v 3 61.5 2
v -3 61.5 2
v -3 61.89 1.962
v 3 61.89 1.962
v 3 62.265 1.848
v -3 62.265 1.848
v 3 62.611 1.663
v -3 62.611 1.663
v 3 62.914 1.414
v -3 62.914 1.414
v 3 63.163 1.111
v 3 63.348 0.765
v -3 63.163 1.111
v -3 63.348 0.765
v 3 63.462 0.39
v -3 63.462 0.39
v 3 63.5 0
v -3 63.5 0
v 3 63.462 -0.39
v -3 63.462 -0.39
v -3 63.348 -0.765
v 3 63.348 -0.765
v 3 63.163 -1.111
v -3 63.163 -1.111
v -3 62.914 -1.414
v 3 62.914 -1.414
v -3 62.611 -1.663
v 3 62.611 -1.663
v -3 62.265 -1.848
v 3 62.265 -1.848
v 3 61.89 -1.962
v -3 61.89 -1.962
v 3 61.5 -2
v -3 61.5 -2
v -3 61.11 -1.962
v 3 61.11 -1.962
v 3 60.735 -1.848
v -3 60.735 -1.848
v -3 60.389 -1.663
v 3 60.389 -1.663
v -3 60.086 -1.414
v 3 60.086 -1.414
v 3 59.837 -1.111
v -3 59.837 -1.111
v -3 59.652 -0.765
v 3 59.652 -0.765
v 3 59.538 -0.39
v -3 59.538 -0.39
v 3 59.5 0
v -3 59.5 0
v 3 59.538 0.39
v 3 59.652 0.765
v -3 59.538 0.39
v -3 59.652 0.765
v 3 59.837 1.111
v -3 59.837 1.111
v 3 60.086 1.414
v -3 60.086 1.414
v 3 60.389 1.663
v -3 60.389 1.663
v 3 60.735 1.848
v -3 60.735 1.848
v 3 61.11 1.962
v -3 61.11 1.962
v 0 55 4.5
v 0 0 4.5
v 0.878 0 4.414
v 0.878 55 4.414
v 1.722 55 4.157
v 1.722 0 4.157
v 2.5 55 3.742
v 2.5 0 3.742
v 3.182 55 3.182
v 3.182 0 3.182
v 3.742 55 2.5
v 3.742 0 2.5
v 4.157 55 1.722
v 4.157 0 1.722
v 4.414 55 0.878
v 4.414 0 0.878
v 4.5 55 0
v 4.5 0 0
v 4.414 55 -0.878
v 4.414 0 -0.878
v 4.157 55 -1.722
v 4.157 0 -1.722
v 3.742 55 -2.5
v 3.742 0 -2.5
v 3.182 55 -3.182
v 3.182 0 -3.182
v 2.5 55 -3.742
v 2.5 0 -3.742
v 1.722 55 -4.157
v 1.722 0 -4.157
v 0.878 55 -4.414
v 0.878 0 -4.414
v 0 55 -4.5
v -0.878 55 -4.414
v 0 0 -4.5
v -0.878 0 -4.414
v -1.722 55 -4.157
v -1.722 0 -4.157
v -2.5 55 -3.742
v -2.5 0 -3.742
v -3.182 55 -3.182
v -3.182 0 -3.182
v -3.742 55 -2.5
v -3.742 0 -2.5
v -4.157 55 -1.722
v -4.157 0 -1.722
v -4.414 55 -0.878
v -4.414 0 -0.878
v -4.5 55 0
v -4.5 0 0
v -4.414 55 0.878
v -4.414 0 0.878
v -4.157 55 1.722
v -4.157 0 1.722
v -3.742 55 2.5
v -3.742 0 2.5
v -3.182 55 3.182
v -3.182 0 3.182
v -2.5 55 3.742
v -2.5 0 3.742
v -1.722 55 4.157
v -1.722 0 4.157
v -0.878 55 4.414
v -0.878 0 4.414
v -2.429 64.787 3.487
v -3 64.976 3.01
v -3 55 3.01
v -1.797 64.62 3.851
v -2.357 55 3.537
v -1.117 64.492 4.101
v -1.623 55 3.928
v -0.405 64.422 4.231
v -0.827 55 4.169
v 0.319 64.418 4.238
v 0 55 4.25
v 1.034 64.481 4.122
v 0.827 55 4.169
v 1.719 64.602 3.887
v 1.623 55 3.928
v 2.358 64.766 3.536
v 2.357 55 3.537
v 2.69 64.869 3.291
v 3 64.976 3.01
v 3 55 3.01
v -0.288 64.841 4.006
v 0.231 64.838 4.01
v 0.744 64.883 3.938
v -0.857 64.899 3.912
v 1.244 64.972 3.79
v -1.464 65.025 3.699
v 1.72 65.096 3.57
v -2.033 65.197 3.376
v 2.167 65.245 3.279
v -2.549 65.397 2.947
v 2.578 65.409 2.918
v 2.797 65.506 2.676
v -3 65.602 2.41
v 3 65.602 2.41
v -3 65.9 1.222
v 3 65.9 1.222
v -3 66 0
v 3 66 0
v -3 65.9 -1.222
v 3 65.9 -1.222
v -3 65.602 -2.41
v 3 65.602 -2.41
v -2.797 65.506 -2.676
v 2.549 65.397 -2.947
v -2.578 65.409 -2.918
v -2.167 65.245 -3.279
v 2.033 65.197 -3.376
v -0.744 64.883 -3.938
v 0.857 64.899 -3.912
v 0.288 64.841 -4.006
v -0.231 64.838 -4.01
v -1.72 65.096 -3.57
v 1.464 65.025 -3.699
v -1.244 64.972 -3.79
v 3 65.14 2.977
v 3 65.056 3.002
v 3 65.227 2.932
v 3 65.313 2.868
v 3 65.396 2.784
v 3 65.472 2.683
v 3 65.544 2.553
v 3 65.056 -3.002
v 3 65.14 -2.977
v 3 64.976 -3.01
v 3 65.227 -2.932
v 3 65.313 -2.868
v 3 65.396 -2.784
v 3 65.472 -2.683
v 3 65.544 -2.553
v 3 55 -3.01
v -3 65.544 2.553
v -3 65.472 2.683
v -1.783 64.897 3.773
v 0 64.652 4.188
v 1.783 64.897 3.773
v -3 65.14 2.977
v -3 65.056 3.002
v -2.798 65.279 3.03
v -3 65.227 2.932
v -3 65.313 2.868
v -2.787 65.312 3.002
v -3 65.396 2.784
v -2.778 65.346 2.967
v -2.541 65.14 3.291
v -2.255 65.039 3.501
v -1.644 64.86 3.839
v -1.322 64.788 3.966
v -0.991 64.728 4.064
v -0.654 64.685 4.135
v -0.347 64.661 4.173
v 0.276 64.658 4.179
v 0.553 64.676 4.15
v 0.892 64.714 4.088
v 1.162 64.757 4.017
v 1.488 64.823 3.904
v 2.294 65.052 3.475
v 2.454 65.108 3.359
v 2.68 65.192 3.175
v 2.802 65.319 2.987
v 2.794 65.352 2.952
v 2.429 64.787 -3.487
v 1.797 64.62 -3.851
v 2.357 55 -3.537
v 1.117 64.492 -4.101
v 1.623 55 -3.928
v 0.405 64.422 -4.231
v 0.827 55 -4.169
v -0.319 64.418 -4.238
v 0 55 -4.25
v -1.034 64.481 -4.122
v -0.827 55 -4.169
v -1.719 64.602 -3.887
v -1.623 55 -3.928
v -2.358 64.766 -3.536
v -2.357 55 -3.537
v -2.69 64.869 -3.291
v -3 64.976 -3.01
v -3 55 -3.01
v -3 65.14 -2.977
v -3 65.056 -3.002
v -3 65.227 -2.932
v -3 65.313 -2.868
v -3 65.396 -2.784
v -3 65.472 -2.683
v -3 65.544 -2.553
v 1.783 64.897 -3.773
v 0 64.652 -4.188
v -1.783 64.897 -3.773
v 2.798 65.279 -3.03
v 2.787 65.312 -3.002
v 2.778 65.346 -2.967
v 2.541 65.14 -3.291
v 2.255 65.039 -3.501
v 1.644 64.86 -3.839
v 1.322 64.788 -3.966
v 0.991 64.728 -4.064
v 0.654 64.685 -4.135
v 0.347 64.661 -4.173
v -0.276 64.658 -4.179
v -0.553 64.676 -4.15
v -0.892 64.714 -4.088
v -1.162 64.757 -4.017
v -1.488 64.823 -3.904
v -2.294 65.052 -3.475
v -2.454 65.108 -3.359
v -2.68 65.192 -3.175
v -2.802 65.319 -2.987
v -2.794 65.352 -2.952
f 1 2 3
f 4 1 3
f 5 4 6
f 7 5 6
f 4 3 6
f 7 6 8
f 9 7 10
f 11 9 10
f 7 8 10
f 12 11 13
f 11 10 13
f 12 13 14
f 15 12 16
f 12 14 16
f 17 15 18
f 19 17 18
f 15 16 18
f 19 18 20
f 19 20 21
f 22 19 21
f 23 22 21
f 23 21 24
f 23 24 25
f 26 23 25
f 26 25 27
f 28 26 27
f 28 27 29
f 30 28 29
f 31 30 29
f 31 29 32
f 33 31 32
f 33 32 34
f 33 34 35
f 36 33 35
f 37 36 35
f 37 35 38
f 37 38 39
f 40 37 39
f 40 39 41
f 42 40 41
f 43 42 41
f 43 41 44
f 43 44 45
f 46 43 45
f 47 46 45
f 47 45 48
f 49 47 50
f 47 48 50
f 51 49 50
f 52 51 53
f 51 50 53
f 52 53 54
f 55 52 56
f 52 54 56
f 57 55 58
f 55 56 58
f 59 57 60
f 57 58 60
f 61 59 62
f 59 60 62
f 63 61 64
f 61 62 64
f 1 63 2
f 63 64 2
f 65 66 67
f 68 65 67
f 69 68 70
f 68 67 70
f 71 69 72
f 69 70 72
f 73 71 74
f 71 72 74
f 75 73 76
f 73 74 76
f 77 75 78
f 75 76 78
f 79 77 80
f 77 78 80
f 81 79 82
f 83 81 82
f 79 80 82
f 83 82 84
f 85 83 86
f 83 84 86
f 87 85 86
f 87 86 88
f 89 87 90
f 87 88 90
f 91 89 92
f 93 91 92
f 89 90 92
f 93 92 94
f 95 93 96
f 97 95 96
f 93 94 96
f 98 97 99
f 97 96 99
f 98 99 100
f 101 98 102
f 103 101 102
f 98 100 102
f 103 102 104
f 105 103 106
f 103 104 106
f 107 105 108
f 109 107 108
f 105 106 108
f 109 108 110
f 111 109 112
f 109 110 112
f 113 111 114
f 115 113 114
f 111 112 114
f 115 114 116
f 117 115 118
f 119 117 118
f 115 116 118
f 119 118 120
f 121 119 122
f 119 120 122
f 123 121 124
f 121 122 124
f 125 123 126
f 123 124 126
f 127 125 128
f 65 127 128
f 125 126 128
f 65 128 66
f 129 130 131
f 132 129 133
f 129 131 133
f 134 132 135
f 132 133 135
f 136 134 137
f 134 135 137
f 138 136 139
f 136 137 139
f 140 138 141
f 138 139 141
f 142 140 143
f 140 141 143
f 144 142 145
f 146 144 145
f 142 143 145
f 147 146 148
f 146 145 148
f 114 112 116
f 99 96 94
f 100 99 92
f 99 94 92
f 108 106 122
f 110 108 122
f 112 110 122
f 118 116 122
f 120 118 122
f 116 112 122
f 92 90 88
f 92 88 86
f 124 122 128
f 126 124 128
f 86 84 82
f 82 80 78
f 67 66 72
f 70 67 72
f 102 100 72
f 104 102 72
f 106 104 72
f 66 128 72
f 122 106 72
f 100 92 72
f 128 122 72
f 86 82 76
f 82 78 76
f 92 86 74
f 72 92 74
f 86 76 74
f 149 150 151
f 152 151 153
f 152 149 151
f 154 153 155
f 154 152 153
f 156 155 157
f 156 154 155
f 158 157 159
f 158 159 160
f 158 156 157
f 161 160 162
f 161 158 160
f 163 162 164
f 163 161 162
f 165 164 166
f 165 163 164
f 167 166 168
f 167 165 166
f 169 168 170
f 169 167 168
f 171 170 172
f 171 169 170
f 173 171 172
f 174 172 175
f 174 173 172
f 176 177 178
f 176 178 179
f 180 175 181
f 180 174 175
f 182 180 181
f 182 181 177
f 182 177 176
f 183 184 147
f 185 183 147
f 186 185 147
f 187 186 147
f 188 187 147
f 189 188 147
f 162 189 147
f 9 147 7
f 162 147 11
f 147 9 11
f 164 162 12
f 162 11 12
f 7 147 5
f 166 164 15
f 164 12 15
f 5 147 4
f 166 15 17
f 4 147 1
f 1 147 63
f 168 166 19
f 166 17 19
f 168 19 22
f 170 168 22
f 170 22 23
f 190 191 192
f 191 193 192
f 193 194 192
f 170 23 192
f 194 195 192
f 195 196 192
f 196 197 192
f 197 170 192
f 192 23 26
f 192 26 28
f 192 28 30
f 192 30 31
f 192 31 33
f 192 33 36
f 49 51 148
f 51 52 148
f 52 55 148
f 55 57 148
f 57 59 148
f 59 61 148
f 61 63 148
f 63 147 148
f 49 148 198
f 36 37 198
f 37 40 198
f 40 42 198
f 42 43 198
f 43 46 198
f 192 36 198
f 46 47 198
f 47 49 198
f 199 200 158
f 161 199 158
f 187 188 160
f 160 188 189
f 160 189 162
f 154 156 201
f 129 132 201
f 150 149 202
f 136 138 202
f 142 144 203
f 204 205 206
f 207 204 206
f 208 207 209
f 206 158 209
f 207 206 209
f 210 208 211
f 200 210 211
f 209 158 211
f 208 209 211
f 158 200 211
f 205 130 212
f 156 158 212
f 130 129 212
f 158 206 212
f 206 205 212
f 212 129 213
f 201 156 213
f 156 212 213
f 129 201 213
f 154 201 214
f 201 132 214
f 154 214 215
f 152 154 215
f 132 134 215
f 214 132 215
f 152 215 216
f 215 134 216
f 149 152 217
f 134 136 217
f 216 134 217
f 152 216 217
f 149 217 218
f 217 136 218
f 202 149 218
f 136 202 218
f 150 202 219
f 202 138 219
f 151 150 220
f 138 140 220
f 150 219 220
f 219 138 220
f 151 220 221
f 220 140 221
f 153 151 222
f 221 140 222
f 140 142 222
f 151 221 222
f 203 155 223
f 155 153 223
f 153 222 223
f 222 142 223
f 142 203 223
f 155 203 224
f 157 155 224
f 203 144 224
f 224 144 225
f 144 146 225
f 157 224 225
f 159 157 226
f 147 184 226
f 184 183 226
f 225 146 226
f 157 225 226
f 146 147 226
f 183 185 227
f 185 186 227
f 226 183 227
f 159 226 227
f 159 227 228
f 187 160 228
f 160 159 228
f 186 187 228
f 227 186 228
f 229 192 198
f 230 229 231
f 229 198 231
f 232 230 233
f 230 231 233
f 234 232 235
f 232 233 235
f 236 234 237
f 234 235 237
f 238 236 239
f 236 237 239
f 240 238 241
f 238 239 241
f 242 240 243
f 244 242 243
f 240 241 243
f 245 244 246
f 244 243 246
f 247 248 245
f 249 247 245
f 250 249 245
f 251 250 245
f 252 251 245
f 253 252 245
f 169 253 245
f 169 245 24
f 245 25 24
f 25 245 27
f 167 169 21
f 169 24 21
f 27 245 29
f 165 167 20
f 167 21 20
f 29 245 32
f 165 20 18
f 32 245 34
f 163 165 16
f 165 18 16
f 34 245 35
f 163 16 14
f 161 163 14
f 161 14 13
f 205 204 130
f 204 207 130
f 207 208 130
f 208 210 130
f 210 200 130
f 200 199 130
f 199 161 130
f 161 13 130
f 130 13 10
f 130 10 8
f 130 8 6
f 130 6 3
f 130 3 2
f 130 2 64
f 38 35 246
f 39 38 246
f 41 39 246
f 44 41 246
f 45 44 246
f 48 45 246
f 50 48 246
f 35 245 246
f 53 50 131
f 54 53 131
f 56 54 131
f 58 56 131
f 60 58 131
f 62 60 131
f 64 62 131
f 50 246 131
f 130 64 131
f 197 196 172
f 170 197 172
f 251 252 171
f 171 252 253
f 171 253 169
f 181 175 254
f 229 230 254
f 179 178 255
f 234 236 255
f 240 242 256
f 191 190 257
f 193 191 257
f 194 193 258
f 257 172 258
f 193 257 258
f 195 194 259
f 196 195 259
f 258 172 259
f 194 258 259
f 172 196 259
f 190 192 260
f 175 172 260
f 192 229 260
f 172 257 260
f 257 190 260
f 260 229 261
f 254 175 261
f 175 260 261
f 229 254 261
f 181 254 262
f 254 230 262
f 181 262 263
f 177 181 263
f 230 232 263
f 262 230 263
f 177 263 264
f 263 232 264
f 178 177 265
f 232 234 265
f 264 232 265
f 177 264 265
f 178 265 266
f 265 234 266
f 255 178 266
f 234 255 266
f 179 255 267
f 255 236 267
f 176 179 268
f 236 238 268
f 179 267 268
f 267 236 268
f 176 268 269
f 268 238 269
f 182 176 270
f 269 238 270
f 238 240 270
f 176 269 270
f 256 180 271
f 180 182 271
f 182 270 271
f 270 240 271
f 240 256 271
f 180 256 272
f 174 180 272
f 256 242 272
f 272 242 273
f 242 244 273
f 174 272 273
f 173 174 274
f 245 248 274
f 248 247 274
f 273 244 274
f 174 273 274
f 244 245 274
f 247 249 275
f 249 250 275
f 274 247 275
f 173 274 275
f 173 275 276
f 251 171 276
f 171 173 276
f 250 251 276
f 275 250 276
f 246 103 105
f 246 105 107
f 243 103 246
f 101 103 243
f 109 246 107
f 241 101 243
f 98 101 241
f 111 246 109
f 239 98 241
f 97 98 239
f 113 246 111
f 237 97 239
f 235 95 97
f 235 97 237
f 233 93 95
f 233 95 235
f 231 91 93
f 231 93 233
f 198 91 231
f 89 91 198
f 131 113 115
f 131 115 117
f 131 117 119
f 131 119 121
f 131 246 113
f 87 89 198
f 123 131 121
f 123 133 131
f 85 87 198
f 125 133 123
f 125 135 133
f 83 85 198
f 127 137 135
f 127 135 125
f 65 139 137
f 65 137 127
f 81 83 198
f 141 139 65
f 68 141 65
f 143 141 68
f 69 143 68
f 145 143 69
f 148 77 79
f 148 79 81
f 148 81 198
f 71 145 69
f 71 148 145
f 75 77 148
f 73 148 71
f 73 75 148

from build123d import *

# Parameters (mm, degrees)
SKETCH_1_R          = 4.5
EXTRUDE_1_DEPTH     = 55
EXTRUDE_2_DEPTH     = 15
SKETCH_4_R          = 2
CUT_EXTRUDE_1_DEPTH = 71.544312315
CUT_EXTRUDE_3_DEPTH = 71.544312315
FILLET_1_R          = 0.5


with BuildPart() as part:
    # 草图1 → 凸台-拉伸1 (new body)
    with BuildSketch(Plane(origin=(0, 0, 0), x_dir=(1, 0, 0), z_dir=(0, 1, 0))):
        with Locations(Location((0, 0, 0), (0, 0, 270))):
            Circle(SKETCH_1_R)
    extrude(amount=EXTRUDE_1_DEPTH)

    # 草图2 → 凸台-拉伸2 (add)
    with BuildSketch(Plane(origin=(0, 55, 0), x_dir=(1, 0, 0), z_dir=(0, 1, 0))):
        with BuildLine():
            Line((-3, 3.010398645), (-3, -3.010398645))
            ThreePointArc((-3, -3.010398645), (0, -4.25), (3, -3.010398645))
            Line((3, -3.010398645), (3, 3.010398645))
            ThreePointArc((3, 3.010398645), (0, 4.25), (-3, 3.010398645))
        make_face()
    extrude(amount=EXTRUDE_2_DEPTH)

    # 草图4 → 切除-拉伸1 (cut, through all)
    with BuildSketch(Plane.ZY.offset(3)):
        with Locations((0, 61.5)):
            Circle(SKETCH_4_R)
    extrude(amount=-CUT_EXTRUDE_1_DEPTH, mode=Mode.SUBTRACT)

    # 草图5 → 切除-拉伸3 (cut, through all)
    with BuildSketch(Plane.ZY.offset(3)):
        with BuildLine():
            Line((-4.813255022, 64.251745482), (-4.813255022, 72.406434262))
            Line((-4.813255022, 72.406434262), (5.466876832, 72.406434262))
            Line((5.466876832, 72.406434262), (5.466876832, 63.634516306))
            ThreePointArc((5.466876832, 63.634516306), (0.449497866, 65.986517994), (-4.813255022, 64.251745482))
        make_face()
    extrude(amount=-CUT_EXTRUDE_3_DEPTH, mode=Mode.SUBTRACT)

    # 圆角1
    fillet_1_edges = [part.edges().sort_by_distance(p)[0] for p in [
        (0, 64.679603547, -4.25),
        (0, 64.679603547, 4.25),
    ]]
    fillet(fillet_1_edges, radius=FILLET_1_R)


solid = part.part
